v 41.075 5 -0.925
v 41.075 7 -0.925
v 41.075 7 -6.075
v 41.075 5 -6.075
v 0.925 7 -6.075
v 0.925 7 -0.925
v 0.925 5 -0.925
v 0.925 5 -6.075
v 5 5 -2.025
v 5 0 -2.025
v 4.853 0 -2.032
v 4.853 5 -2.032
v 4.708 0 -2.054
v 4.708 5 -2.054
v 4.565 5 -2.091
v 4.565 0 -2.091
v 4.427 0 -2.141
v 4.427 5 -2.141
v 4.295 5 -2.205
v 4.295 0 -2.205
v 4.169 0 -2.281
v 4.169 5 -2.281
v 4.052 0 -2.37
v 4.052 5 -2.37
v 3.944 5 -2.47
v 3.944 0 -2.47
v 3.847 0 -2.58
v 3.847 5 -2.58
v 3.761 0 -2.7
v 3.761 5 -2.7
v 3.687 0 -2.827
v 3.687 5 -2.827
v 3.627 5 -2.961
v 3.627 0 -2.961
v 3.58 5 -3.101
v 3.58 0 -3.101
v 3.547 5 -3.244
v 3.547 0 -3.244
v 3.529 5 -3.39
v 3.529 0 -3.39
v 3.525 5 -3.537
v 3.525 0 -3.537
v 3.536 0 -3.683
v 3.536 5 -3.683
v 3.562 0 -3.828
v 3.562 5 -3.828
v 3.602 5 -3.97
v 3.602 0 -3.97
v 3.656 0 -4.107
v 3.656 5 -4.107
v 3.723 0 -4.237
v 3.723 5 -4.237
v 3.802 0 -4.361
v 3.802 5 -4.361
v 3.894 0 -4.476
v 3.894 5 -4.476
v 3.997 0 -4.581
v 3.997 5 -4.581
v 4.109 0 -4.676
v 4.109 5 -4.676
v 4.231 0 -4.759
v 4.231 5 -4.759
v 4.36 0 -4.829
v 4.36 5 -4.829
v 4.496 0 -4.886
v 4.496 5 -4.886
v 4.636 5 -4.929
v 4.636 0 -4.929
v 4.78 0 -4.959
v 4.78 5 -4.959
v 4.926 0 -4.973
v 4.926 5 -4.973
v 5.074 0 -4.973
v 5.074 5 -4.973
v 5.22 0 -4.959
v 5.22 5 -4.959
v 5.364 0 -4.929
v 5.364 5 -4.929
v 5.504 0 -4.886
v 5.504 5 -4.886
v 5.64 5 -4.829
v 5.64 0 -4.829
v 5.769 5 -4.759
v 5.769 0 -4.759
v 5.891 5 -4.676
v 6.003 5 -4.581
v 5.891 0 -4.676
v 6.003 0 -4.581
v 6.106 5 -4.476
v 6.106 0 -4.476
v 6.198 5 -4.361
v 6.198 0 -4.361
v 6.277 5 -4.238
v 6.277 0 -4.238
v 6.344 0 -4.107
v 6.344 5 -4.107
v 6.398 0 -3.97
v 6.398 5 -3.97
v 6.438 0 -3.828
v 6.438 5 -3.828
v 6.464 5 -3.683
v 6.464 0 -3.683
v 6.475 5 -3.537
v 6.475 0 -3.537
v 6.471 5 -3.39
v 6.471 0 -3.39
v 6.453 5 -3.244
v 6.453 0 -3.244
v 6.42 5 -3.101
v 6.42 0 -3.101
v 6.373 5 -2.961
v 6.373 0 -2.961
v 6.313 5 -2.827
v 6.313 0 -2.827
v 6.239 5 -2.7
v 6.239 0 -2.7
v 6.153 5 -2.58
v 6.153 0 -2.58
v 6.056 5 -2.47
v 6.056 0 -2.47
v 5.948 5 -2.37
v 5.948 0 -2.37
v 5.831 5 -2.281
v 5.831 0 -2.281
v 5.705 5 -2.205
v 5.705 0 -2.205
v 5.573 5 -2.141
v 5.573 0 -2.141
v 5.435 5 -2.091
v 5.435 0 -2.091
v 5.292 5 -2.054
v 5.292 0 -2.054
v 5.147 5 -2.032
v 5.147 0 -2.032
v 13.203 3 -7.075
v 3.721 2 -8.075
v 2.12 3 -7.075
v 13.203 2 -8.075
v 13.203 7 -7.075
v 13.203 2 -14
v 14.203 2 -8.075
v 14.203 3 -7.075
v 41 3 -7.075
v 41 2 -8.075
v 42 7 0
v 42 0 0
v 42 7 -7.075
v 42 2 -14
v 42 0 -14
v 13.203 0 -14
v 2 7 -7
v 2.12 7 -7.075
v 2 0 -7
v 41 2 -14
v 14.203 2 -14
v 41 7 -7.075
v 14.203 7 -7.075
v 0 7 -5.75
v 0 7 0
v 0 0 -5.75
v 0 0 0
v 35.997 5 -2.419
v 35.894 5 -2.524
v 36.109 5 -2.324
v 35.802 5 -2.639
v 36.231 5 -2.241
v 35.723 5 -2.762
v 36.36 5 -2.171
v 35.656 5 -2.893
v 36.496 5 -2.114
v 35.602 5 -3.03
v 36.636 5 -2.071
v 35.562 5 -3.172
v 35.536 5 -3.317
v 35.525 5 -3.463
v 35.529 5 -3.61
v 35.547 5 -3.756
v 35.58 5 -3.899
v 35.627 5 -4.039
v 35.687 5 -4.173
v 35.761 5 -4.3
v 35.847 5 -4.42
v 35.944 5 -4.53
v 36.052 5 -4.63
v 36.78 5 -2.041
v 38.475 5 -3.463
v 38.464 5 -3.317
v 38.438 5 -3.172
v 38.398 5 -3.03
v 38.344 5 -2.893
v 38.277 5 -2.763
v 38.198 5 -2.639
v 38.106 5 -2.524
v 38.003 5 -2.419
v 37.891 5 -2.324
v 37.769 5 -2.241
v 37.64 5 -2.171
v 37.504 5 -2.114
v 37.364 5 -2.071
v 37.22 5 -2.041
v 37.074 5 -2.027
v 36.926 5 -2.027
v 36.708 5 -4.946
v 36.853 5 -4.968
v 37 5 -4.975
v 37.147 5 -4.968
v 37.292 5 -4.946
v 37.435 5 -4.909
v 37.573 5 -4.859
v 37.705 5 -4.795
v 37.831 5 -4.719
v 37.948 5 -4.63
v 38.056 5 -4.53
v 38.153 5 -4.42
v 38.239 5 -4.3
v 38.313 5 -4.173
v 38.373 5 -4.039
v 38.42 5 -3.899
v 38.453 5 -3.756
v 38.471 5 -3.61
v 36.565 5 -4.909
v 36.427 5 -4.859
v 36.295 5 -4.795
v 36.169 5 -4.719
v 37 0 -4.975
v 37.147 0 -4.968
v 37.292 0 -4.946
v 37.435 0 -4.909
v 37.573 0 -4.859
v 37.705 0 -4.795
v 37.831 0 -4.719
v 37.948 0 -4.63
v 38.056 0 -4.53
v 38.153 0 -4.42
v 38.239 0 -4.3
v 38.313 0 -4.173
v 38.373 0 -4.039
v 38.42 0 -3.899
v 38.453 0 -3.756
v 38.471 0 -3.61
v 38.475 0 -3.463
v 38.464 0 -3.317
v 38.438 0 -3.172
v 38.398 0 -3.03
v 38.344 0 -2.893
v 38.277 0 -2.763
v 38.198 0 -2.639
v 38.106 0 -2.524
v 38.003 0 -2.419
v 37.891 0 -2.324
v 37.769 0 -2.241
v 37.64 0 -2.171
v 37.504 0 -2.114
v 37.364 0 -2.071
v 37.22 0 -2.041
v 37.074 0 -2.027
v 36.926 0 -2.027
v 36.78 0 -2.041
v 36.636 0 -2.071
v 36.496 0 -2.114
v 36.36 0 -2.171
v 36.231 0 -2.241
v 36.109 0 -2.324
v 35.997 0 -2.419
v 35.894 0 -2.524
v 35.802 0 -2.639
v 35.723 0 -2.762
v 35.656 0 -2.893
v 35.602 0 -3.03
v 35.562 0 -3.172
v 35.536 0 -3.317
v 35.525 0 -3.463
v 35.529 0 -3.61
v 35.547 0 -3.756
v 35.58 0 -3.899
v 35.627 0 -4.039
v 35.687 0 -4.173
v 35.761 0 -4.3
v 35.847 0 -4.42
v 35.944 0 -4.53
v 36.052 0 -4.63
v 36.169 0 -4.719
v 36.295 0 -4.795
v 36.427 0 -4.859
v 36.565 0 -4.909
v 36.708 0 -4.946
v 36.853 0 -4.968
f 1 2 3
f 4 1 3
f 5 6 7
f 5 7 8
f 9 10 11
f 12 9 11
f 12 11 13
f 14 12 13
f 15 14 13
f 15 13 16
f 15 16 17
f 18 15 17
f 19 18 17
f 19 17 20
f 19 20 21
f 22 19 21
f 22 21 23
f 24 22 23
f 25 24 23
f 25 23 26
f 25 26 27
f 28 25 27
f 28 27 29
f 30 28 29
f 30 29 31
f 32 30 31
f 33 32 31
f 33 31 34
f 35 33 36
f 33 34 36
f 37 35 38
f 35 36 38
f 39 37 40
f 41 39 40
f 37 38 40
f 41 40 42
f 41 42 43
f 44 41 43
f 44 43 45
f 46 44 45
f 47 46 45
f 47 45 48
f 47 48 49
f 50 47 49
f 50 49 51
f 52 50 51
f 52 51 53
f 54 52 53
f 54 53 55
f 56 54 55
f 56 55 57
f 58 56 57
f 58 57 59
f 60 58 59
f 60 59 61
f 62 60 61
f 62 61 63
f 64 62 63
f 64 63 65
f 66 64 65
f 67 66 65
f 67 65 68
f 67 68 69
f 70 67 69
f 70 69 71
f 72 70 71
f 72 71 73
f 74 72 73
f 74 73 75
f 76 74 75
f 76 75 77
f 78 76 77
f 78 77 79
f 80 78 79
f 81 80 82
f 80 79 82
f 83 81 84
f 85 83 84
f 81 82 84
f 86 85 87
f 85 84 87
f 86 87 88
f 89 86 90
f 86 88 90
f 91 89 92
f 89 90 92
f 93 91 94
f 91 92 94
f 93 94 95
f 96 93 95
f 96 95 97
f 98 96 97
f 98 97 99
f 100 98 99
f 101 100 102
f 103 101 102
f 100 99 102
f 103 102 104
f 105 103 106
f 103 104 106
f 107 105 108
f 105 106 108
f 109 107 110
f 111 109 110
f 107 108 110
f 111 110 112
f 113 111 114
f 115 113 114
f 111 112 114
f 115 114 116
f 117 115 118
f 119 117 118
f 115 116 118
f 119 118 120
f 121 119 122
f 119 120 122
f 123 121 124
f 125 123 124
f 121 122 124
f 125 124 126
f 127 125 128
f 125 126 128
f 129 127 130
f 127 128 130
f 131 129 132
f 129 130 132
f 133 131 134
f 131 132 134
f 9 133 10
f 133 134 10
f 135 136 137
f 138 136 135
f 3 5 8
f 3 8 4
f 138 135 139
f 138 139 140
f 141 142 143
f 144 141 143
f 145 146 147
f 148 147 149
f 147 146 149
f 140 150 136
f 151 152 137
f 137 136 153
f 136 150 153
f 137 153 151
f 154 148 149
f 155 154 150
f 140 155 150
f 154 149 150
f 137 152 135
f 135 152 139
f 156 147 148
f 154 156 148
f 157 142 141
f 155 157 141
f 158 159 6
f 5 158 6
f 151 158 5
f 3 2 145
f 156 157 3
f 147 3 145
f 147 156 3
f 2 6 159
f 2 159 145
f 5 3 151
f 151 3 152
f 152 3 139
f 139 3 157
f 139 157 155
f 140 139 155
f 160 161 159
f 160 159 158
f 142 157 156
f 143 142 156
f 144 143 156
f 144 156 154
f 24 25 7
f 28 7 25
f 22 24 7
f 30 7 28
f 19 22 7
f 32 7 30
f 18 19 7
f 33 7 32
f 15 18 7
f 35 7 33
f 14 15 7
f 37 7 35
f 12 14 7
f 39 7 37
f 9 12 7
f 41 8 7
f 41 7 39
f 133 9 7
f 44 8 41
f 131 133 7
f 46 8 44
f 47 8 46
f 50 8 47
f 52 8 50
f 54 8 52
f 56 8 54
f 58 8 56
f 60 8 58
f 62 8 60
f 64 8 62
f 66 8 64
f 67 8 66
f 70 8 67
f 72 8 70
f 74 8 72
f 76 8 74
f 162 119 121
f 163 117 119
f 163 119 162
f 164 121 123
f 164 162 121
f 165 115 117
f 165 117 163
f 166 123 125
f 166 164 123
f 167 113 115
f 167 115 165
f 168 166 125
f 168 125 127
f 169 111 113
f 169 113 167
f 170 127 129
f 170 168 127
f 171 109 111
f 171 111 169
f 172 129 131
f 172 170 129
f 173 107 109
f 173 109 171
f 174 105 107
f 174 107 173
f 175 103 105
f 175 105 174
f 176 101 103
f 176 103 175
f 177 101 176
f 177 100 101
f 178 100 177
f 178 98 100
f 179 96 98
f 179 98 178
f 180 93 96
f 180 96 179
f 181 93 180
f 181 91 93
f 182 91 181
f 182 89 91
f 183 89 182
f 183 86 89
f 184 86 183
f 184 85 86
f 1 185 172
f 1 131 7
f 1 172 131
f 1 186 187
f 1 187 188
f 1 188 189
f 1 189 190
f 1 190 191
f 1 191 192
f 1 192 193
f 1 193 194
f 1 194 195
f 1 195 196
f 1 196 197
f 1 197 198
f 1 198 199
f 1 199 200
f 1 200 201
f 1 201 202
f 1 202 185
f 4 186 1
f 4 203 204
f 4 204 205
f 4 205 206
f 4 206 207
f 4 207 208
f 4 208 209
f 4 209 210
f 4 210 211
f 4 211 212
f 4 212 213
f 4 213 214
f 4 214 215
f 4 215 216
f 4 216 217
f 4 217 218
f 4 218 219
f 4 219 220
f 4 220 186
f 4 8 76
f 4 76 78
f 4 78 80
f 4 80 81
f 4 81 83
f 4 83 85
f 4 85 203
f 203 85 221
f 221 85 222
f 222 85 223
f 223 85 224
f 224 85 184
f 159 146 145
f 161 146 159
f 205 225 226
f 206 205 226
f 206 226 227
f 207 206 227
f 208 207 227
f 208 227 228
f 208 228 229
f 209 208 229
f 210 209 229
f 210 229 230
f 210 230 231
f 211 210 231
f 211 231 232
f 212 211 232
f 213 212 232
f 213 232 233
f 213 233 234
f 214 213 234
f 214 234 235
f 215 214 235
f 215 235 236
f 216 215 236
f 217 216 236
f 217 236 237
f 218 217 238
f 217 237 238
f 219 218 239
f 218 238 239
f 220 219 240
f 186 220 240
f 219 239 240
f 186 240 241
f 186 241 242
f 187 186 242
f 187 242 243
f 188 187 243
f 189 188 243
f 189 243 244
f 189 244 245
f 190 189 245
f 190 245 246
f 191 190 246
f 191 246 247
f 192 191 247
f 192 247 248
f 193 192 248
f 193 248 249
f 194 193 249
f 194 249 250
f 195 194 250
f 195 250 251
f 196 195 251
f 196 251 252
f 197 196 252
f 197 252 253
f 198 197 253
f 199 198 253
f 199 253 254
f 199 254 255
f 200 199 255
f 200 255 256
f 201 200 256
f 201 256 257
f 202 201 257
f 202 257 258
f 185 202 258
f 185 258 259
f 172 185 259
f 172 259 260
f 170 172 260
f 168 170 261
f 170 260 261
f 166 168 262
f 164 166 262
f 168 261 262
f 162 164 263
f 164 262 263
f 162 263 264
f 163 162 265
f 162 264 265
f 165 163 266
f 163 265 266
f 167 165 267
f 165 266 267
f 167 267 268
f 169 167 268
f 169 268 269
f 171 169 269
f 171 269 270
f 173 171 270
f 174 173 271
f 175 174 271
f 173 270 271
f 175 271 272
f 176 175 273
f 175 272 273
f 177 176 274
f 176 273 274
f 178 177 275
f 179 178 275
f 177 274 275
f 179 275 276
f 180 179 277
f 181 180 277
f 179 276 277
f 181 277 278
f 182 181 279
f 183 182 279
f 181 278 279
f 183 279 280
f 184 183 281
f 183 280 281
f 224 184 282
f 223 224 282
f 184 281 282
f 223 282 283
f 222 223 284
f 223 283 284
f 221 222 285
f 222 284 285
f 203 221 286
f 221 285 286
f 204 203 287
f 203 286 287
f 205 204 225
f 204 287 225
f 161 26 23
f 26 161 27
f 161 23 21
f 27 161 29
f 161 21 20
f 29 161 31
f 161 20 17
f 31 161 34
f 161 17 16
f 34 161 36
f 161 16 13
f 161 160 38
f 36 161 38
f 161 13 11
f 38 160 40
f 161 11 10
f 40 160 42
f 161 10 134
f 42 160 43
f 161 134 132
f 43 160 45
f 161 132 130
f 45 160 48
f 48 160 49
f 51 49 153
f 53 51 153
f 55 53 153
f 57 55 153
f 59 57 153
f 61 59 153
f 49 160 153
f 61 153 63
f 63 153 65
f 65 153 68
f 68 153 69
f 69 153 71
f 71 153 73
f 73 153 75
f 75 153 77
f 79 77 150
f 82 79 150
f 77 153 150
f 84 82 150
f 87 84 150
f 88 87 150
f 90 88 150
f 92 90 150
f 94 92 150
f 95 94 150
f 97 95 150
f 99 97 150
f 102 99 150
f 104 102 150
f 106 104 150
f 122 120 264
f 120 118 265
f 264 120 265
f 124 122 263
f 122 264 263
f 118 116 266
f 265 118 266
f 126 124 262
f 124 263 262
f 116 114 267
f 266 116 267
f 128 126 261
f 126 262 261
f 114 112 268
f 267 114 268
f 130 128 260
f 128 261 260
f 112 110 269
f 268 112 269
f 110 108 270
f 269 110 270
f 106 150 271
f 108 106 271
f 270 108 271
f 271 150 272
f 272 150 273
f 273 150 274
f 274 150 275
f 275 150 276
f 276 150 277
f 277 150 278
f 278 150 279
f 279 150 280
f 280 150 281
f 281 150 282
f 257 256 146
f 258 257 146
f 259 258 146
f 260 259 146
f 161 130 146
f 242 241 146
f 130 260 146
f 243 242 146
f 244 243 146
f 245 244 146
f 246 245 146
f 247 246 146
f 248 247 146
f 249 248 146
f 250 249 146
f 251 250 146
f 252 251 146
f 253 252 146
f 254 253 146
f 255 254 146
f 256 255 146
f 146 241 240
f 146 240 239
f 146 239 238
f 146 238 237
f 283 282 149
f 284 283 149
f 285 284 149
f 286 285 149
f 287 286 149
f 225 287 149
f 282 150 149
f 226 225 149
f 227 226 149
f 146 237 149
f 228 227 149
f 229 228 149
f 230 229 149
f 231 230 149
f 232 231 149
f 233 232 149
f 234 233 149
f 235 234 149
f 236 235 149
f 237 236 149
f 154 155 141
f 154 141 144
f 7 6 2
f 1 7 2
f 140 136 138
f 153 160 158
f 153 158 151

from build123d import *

# Parameters (mm, degrees)
RISER_DEPTH             = 7
SKETCH2_R               = 1.475
MOUNTING_HOLES_DEPTH    = 44.150898021
SKETCH3_W               = 40.15
SKETCH3_H               = 5.15
RECESS_DEPTH            = 2
FLANGE_DEPTH            = 7
SKETCH5_W               = 26.797240136
SKETCH5_H               = 6.925
FLANGE_CUTOUT_DEPTH     = 5
ANGLE_CUTOUT_DEPTH      = 44.886216515
ANGLE_CUTOUT_DEPTH_BACK = 44.886216515
FLANGE_CHAMFER_1_SIZE   = 1
FLANGE_CHAMFER_2_SIZE   = 1


with BuildPart() as part:
    # Sketch1 → Riser (new body)
    with BuildSketch(Plane(origin=(0, 0, 0), x_dir=(1, 0, 0), z_dir=(0, 1, 0))):
        Polygon((2.000418161, 7), (42, 7), (42, 0), (0, 0), (0, 5.75), align=None)
    extrude(amount=RISER_DEPTH)

    # Sketch2 → Mounting Holes (cut, through all)
    with BuildSketch(Plane.XZ):
        with Locations(Location((37, -3.5, 0), (0, 0, 270))):
            Circle(SKETCH2_R)
        with Locations(Location((5, -3.5, 0), (0, 0, 90))):
            Circle(SKETCH2_R)
    extrude(amount=-MOUNTING_HOLES_DEPTH, mode=Mode.SUBTRACT)

    # Sketch3 → Recess (cut)
    with BuildSketch(Plane(origin=(0, 7, 0), x_dir=(1, 0, 0), z_dir=(0, 1, 0))):
        with Locations((21, 3.5)):
            Rectangle(SKETCH3_W, SKETCH3_H)
    extrude(amount=-RECESS_DEPTH, mode=Mode.SUBTRACT)

    # Sketch4 → Flange (add)
    with BuildSketch(Plane(origin=(0, 0, 0), x_dir=(1, 0, 0), z_dir=(0, 1, 0))):
        Polygon((2.000418161, 7), (42, 7), (42, 14), (13.202759864, 14), align=None)
    extrude(amount=FLANGE_DEPTH)

    # Sketch5 → Flange Cutout (cut)
    with BuildSketch(Plane(origin=(0, 7, 0), x_dir=(1, 0, 0), z_dir=(0, 1, 0))):
        with Locations((27.601379932, 10.5375)):
            Rectangle(SKETCH5_W, SKETCH5_H)
        Polygon((2.120443251, 7.075), (13.202759864, 7.075), (13.202759864, 14), align=None)
    extrude(amount=-FLANGE_CUTOUT_DEPTH, mode=Mode.SUBTRACT)

    # Sketch7 → Angle Cutout (cut, two sides: drawn at the far end of the back side and taken through both)
    with BuildSketch(Plane.ZY.offset(-41).offset(-ANGLE_CUTOUT_DEPTH_BACK)):
        Polygon((-7.075, 7), (-14, 2), (-14, 7), align=None)
    extrude(amount=ANGLE_CUTOUT_DEPTH + ANGLE_CUTOUT_DEPTH_BACK, mode=Mode.SUBTRACT)

    # Flange Chamfer 1
    flange_chamfer_1_edges = [part.edges().sort_by_distance(p)[0] for p in [
        (27.601379932, 2, -7.075),
    ]]
    chamfer(flange_chamfer_1_edges, length=FLANGE_CHAMFER_1_SIZE)

    # Flange Chamfer 2
    flange_chamfer_2_edges = [part.edges().sort_by_distance(p)[0] for p in [
        (7.661601558, 2, -7.075),
    ]]
    chamfer(flange_chamfer_2_edges, length=FLANGE_CHAMFER_2_SIZE)


solid = part.part
